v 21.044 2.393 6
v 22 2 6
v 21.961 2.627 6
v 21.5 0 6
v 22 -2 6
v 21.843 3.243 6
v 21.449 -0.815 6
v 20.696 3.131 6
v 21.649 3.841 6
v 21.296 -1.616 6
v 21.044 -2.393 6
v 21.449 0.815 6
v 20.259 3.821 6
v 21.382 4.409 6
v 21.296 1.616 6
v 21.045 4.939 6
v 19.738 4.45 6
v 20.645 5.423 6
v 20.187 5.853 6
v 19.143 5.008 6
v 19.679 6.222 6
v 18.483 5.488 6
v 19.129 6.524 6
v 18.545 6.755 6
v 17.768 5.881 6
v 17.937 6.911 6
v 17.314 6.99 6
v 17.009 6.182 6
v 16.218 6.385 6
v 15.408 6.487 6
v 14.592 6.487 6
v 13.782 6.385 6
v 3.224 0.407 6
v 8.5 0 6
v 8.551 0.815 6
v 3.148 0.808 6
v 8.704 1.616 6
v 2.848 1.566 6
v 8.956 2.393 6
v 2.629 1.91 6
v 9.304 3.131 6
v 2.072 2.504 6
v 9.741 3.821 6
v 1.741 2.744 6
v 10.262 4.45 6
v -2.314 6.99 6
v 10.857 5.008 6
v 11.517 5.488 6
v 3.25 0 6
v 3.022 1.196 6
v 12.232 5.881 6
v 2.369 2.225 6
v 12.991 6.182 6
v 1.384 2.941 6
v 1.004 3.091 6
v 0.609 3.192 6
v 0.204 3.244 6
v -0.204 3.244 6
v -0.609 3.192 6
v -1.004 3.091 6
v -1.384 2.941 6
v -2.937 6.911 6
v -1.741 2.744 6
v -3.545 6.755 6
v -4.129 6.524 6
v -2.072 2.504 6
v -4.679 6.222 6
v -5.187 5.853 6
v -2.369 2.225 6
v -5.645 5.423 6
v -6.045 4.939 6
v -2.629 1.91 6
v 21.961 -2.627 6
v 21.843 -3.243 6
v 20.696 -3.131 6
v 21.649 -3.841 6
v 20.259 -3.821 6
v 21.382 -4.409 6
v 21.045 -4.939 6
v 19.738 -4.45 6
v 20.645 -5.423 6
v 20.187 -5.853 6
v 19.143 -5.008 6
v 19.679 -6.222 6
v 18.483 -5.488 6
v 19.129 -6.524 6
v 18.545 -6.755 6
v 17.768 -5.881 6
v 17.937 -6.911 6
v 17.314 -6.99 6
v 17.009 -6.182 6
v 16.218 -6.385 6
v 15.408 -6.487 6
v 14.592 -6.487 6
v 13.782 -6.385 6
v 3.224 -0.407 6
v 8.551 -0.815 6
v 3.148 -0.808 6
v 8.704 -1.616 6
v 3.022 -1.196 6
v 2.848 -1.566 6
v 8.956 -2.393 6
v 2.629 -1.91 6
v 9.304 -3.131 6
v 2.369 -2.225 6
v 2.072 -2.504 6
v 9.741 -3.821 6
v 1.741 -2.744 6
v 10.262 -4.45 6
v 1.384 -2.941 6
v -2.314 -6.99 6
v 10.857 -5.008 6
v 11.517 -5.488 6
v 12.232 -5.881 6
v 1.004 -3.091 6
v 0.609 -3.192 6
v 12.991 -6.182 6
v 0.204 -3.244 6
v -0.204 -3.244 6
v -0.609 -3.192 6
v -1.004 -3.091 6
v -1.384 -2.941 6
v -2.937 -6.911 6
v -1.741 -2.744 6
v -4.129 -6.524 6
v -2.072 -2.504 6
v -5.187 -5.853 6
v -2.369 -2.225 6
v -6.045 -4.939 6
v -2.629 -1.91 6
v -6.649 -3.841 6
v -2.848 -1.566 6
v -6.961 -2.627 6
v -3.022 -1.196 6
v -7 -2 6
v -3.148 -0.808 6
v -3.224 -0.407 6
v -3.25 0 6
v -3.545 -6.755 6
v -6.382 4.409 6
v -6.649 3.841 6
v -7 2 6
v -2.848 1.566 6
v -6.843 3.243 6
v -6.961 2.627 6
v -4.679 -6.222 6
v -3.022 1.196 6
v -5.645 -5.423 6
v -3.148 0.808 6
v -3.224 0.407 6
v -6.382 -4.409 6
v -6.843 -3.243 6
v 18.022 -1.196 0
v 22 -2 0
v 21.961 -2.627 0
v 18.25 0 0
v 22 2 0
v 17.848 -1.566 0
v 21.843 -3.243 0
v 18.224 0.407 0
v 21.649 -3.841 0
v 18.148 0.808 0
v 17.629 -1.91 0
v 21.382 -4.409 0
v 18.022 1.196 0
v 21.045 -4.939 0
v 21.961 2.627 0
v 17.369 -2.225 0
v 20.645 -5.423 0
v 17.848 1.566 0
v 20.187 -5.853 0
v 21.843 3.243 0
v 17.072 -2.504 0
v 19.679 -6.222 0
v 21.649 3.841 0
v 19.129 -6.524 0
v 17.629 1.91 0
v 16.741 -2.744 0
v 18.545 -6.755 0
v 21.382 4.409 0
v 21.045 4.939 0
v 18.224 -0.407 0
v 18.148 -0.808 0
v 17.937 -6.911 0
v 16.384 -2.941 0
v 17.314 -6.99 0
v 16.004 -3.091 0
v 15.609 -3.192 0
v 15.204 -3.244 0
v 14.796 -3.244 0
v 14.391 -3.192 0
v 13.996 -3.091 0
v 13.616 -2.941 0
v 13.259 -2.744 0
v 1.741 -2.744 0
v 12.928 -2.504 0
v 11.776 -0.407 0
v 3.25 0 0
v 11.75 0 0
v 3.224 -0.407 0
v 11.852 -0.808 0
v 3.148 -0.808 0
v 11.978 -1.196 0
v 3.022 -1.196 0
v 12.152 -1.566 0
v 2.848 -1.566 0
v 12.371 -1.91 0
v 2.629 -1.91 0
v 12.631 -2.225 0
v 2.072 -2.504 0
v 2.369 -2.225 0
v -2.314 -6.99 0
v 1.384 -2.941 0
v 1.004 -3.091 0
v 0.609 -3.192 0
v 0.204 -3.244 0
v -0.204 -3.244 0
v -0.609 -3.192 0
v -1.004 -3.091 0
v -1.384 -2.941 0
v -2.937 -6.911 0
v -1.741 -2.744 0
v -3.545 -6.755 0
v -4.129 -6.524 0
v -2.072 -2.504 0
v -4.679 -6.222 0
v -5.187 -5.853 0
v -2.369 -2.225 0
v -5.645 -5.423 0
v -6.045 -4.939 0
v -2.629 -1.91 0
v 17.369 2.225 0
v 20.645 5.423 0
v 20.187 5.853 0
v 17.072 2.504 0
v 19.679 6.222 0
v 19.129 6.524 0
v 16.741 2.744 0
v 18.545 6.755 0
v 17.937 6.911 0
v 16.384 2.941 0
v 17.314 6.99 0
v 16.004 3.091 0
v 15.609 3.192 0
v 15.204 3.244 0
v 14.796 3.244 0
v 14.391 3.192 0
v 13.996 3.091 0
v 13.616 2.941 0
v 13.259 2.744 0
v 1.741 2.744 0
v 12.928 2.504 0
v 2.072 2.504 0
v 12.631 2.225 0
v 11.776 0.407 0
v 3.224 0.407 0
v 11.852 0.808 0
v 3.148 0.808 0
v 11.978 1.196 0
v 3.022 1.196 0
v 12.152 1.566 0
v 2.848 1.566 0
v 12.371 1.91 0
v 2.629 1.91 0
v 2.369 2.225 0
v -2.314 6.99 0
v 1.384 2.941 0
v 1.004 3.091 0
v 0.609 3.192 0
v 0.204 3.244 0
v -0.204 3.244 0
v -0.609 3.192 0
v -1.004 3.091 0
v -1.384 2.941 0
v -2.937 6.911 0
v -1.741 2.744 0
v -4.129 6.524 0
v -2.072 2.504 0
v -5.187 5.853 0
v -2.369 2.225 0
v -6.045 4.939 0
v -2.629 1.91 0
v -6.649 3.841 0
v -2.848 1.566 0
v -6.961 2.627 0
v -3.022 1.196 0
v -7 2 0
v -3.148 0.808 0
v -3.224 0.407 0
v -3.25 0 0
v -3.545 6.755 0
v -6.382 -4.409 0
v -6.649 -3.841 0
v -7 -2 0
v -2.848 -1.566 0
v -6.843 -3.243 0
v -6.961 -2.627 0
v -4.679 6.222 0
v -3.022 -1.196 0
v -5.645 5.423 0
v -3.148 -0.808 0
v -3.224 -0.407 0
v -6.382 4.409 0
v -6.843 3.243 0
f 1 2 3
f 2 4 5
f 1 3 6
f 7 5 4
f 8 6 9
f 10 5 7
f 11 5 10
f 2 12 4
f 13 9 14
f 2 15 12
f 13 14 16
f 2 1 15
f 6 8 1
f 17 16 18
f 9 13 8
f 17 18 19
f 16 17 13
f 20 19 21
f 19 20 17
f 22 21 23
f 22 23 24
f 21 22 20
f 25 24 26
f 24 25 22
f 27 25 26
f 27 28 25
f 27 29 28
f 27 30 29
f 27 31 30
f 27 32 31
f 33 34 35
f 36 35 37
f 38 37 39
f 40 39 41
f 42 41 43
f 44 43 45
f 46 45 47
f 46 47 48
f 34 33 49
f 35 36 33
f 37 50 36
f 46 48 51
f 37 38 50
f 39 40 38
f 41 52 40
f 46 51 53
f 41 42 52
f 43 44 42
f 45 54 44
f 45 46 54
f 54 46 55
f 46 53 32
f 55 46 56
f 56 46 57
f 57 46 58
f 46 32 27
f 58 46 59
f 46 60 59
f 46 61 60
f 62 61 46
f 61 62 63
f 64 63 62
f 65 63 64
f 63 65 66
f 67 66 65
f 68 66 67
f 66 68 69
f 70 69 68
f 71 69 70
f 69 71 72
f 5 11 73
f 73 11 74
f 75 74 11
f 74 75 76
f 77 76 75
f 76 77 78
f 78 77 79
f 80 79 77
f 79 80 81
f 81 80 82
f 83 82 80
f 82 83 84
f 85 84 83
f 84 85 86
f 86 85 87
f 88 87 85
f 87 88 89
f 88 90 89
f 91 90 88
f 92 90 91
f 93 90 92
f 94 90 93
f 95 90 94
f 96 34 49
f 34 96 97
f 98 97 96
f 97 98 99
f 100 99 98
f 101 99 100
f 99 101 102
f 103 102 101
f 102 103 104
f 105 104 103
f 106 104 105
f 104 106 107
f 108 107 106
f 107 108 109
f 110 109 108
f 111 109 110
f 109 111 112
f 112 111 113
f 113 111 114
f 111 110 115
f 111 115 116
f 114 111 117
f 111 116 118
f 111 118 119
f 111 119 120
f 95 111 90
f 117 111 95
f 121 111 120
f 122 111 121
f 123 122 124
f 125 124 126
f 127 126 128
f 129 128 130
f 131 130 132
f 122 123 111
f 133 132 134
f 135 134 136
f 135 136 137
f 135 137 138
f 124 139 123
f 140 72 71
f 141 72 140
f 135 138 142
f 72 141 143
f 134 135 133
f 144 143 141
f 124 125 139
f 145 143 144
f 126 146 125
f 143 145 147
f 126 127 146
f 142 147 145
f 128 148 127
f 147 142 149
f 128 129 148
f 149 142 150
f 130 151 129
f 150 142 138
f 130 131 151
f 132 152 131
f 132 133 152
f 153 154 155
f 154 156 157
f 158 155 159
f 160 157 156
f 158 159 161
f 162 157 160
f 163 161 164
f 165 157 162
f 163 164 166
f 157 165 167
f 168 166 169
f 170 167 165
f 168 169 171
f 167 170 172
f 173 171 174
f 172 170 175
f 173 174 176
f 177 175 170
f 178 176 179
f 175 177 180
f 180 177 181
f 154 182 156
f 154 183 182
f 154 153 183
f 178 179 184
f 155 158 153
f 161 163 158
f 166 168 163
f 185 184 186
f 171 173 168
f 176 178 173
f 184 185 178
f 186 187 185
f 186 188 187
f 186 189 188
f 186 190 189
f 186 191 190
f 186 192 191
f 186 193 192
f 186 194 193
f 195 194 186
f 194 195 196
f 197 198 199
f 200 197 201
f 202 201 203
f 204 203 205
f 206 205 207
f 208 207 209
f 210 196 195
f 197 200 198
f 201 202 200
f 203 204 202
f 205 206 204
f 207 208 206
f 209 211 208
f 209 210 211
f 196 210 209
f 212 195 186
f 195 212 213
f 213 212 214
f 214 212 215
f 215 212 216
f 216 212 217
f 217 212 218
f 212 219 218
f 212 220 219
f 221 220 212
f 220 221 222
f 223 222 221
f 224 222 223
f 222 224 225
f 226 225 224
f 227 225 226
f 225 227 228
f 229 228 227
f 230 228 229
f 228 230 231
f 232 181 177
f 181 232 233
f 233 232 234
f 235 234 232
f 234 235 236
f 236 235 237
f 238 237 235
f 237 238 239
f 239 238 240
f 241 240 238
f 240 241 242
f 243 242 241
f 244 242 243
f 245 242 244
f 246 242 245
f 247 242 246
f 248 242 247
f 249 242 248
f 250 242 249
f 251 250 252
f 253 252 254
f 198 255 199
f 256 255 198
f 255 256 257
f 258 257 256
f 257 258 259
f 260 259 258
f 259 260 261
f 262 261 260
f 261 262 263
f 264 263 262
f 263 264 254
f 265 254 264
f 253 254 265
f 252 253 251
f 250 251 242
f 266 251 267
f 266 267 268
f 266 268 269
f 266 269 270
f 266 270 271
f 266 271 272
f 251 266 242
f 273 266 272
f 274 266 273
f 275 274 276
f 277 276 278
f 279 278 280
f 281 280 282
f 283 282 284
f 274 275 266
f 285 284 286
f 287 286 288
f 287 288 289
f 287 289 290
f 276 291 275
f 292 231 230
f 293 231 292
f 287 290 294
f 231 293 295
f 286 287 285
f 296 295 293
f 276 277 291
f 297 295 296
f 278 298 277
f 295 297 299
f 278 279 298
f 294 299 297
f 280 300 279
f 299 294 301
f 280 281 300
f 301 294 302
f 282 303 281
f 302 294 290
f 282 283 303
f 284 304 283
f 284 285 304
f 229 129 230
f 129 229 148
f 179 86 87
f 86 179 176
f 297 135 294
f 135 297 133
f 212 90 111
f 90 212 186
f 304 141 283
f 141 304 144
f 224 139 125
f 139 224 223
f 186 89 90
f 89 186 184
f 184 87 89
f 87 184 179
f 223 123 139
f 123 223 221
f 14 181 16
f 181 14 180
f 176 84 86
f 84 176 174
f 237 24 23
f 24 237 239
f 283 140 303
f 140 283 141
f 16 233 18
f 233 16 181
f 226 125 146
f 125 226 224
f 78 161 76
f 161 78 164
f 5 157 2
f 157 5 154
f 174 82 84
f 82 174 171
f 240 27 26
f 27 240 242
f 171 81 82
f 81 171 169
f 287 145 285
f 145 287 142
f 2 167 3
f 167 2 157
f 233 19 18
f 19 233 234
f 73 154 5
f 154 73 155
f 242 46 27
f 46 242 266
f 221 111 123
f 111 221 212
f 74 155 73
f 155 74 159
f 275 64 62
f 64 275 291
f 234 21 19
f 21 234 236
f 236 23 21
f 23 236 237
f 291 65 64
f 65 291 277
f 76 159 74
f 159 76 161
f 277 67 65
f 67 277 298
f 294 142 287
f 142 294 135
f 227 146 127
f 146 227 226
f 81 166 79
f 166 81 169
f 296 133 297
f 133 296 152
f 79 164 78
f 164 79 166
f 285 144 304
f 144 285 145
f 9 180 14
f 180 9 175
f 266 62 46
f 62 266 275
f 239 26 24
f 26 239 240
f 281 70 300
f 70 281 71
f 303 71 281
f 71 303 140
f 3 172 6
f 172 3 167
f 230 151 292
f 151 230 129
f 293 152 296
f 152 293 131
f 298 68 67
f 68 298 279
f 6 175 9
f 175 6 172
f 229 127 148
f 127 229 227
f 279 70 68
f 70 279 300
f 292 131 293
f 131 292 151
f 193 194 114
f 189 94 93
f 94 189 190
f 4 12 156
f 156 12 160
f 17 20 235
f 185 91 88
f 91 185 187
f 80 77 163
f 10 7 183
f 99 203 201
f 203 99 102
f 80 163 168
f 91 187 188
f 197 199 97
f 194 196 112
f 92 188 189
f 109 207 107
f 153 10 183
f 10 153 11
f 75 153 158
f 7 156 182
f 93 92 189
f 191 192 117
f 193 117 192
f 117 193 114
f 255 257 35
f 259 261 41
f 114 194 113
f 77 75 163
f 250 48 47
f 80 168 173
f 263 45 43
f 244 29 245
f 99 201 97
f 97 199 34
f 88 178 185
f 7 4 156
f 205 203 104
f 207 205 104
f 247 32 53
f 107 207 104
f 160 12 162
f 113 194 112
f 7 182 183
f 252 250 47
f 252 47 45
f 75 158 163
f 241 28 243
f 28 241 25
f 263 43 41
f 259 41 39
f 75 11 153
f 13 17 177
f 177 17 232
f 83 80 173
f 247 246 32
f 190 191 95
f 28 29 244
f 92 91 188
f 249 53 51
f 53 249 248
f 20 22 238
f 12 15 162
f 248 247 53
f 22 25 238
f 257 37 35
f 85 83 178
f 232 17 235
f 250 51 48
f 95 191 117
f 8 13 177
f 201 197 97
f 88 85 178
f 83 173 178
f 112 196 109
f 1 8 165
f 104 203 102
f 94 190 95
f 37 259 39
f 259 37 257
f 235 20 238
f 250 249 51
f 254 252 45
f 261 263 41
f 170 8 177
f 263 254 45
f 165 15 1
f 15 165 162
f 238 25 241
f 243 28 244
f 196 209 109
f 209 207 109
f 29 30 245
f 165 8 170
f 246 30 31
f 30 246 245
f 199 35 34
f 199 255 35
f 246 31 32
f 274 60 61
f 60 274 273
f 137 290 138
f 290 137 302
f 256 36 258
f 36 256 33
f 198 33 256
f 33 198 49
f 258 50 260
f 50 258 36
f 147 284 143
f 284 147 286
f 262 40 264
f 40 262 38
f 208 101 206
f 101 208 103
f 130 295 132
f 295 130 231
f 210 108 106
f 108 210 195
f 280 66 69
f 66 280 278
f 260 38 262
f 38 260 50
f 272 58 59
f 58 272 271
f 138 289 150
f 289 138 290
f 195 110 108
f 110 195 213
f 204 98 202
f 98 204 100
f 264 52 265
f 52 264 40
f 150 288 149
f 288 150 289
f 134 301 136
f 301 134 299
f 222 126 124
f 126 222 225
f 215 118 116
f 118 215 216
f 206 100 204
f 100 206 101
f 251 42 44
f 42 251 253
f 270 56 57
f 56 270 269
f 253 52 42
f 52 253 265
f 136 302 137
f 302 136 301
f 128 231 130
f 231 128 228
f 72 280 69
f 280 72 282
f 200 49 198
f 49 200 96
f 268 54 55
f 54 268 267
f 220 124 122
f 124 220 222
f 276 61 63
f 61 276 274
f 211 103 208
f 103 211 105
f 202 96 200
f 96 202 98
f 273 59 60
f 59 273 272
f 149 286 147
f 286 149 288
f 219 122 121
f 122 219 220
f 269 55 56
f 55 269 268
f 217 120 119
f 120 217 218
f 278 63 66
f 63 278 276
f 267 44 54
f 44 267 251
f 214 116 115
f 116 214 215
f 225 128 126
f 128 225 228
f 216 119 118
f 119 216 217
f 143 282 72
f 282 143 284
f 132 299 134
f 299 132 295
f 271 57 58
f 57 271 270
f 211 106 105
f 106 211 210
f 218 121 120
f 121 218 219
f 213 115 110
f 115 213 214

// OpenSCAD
$fn = 50;


difference() {
	union() {
		cylinder(h = 6, r = 7.0000000000);
		translate(v = [7.5000000000, 0.0000000000, 0]) {
			hull() {
				translate(v = [-9.5000000000, 2.0000000000, 0]) {
					cylinder(h = 6, r = 5);
				}
				translate(v = [9.5000000000, 2.0000000000, 0]) {
					cylinder(h = 6, r = 5);
				}
				translate(v = [-9.5000000000, -2.0000000000, 0]) {
					cylinder(h = 6, r = 5);
				}
				translate(v = [9.5000000000, -2.0000000000, 0]) {
					cylinder(h = 6, r = 5);
				}
			}
		}
		translate(v = [7.5000000000, 0.0000000000, 0]) {
			hull() {
				translate(v = [-9.5000000000, 2.0000000000, 0]) {
					cylinder(h = 6, r = 5);
				}
				translate(v = [9.5000000000, 2.0000000000, 0]) {
					cylinder(h = 6, r = 5);
				}
				translate(v = [-9.5000000000, -2.0000000000, 0]) {
					cylinder(h = 6, r = 5);
				}
				translate(v = [9.5000000000, -2.0000000000, 0]) {
					cylinder(h = 6, r = 5);
				}
			}
		}
	}
	union() {
		translate(v = [15.0000000000, 0.0000000000, 6]) {
			rotate(a = [0, 0, 0]) {
				difference() {
					union() {
						#translate(v = [0, 0, -6.0000000000]) {
							cylinder(h = 6, r = 2.2500000000);
						}
						#translate(v = [0, 0, -6]) {
							cylinder(h = 6, r1 = 3.2500000000, r2 = 6.5000000000);
						}
						#translate(v = [0, 0, -6.0000000000]) {
							cylinder(h = 6, r = 3.2500000000);
						}
						#translate(v = [0, 0, -6.0000000000]) {
							cylinder(h = 6, r = 2.2500000000);
						}
					}
					union();
				}
			}
		}
		translate(v = [15.0000000000, 0.0000000000, 6]) {
			rotate(a = [0, 0, 0]) {
				difference() {
					union() {
						#translate(v = [0, 0, -6.0000000000]) {
							cylinder(h = 6, r = 2.2500000000);
						}
						#translate(v = [0, 0, -6]) {
							cylinder(h = 6, r1 = 3.2500000000, r2 = 6.5000000000);
						}
						#translate(v = [0, 0, -6.0000000000]) {
							cylinder(h = 6, r = 3.2500000000);
						}
						#translate(v = [0, 0, -6.0000000000]) {
							cylinder(h = 6, r = 2.2500000000);
						}
					}
					union();
				}
			}
		}
		translate(v = [0, 0, -100]) {
			cylinder(h = 200, r = 3.2500000000);
		}
		translate(v = [0, 0, -100]) {
			cylinder(h = 200, r = 1.8000000000);
		}
	}
}
